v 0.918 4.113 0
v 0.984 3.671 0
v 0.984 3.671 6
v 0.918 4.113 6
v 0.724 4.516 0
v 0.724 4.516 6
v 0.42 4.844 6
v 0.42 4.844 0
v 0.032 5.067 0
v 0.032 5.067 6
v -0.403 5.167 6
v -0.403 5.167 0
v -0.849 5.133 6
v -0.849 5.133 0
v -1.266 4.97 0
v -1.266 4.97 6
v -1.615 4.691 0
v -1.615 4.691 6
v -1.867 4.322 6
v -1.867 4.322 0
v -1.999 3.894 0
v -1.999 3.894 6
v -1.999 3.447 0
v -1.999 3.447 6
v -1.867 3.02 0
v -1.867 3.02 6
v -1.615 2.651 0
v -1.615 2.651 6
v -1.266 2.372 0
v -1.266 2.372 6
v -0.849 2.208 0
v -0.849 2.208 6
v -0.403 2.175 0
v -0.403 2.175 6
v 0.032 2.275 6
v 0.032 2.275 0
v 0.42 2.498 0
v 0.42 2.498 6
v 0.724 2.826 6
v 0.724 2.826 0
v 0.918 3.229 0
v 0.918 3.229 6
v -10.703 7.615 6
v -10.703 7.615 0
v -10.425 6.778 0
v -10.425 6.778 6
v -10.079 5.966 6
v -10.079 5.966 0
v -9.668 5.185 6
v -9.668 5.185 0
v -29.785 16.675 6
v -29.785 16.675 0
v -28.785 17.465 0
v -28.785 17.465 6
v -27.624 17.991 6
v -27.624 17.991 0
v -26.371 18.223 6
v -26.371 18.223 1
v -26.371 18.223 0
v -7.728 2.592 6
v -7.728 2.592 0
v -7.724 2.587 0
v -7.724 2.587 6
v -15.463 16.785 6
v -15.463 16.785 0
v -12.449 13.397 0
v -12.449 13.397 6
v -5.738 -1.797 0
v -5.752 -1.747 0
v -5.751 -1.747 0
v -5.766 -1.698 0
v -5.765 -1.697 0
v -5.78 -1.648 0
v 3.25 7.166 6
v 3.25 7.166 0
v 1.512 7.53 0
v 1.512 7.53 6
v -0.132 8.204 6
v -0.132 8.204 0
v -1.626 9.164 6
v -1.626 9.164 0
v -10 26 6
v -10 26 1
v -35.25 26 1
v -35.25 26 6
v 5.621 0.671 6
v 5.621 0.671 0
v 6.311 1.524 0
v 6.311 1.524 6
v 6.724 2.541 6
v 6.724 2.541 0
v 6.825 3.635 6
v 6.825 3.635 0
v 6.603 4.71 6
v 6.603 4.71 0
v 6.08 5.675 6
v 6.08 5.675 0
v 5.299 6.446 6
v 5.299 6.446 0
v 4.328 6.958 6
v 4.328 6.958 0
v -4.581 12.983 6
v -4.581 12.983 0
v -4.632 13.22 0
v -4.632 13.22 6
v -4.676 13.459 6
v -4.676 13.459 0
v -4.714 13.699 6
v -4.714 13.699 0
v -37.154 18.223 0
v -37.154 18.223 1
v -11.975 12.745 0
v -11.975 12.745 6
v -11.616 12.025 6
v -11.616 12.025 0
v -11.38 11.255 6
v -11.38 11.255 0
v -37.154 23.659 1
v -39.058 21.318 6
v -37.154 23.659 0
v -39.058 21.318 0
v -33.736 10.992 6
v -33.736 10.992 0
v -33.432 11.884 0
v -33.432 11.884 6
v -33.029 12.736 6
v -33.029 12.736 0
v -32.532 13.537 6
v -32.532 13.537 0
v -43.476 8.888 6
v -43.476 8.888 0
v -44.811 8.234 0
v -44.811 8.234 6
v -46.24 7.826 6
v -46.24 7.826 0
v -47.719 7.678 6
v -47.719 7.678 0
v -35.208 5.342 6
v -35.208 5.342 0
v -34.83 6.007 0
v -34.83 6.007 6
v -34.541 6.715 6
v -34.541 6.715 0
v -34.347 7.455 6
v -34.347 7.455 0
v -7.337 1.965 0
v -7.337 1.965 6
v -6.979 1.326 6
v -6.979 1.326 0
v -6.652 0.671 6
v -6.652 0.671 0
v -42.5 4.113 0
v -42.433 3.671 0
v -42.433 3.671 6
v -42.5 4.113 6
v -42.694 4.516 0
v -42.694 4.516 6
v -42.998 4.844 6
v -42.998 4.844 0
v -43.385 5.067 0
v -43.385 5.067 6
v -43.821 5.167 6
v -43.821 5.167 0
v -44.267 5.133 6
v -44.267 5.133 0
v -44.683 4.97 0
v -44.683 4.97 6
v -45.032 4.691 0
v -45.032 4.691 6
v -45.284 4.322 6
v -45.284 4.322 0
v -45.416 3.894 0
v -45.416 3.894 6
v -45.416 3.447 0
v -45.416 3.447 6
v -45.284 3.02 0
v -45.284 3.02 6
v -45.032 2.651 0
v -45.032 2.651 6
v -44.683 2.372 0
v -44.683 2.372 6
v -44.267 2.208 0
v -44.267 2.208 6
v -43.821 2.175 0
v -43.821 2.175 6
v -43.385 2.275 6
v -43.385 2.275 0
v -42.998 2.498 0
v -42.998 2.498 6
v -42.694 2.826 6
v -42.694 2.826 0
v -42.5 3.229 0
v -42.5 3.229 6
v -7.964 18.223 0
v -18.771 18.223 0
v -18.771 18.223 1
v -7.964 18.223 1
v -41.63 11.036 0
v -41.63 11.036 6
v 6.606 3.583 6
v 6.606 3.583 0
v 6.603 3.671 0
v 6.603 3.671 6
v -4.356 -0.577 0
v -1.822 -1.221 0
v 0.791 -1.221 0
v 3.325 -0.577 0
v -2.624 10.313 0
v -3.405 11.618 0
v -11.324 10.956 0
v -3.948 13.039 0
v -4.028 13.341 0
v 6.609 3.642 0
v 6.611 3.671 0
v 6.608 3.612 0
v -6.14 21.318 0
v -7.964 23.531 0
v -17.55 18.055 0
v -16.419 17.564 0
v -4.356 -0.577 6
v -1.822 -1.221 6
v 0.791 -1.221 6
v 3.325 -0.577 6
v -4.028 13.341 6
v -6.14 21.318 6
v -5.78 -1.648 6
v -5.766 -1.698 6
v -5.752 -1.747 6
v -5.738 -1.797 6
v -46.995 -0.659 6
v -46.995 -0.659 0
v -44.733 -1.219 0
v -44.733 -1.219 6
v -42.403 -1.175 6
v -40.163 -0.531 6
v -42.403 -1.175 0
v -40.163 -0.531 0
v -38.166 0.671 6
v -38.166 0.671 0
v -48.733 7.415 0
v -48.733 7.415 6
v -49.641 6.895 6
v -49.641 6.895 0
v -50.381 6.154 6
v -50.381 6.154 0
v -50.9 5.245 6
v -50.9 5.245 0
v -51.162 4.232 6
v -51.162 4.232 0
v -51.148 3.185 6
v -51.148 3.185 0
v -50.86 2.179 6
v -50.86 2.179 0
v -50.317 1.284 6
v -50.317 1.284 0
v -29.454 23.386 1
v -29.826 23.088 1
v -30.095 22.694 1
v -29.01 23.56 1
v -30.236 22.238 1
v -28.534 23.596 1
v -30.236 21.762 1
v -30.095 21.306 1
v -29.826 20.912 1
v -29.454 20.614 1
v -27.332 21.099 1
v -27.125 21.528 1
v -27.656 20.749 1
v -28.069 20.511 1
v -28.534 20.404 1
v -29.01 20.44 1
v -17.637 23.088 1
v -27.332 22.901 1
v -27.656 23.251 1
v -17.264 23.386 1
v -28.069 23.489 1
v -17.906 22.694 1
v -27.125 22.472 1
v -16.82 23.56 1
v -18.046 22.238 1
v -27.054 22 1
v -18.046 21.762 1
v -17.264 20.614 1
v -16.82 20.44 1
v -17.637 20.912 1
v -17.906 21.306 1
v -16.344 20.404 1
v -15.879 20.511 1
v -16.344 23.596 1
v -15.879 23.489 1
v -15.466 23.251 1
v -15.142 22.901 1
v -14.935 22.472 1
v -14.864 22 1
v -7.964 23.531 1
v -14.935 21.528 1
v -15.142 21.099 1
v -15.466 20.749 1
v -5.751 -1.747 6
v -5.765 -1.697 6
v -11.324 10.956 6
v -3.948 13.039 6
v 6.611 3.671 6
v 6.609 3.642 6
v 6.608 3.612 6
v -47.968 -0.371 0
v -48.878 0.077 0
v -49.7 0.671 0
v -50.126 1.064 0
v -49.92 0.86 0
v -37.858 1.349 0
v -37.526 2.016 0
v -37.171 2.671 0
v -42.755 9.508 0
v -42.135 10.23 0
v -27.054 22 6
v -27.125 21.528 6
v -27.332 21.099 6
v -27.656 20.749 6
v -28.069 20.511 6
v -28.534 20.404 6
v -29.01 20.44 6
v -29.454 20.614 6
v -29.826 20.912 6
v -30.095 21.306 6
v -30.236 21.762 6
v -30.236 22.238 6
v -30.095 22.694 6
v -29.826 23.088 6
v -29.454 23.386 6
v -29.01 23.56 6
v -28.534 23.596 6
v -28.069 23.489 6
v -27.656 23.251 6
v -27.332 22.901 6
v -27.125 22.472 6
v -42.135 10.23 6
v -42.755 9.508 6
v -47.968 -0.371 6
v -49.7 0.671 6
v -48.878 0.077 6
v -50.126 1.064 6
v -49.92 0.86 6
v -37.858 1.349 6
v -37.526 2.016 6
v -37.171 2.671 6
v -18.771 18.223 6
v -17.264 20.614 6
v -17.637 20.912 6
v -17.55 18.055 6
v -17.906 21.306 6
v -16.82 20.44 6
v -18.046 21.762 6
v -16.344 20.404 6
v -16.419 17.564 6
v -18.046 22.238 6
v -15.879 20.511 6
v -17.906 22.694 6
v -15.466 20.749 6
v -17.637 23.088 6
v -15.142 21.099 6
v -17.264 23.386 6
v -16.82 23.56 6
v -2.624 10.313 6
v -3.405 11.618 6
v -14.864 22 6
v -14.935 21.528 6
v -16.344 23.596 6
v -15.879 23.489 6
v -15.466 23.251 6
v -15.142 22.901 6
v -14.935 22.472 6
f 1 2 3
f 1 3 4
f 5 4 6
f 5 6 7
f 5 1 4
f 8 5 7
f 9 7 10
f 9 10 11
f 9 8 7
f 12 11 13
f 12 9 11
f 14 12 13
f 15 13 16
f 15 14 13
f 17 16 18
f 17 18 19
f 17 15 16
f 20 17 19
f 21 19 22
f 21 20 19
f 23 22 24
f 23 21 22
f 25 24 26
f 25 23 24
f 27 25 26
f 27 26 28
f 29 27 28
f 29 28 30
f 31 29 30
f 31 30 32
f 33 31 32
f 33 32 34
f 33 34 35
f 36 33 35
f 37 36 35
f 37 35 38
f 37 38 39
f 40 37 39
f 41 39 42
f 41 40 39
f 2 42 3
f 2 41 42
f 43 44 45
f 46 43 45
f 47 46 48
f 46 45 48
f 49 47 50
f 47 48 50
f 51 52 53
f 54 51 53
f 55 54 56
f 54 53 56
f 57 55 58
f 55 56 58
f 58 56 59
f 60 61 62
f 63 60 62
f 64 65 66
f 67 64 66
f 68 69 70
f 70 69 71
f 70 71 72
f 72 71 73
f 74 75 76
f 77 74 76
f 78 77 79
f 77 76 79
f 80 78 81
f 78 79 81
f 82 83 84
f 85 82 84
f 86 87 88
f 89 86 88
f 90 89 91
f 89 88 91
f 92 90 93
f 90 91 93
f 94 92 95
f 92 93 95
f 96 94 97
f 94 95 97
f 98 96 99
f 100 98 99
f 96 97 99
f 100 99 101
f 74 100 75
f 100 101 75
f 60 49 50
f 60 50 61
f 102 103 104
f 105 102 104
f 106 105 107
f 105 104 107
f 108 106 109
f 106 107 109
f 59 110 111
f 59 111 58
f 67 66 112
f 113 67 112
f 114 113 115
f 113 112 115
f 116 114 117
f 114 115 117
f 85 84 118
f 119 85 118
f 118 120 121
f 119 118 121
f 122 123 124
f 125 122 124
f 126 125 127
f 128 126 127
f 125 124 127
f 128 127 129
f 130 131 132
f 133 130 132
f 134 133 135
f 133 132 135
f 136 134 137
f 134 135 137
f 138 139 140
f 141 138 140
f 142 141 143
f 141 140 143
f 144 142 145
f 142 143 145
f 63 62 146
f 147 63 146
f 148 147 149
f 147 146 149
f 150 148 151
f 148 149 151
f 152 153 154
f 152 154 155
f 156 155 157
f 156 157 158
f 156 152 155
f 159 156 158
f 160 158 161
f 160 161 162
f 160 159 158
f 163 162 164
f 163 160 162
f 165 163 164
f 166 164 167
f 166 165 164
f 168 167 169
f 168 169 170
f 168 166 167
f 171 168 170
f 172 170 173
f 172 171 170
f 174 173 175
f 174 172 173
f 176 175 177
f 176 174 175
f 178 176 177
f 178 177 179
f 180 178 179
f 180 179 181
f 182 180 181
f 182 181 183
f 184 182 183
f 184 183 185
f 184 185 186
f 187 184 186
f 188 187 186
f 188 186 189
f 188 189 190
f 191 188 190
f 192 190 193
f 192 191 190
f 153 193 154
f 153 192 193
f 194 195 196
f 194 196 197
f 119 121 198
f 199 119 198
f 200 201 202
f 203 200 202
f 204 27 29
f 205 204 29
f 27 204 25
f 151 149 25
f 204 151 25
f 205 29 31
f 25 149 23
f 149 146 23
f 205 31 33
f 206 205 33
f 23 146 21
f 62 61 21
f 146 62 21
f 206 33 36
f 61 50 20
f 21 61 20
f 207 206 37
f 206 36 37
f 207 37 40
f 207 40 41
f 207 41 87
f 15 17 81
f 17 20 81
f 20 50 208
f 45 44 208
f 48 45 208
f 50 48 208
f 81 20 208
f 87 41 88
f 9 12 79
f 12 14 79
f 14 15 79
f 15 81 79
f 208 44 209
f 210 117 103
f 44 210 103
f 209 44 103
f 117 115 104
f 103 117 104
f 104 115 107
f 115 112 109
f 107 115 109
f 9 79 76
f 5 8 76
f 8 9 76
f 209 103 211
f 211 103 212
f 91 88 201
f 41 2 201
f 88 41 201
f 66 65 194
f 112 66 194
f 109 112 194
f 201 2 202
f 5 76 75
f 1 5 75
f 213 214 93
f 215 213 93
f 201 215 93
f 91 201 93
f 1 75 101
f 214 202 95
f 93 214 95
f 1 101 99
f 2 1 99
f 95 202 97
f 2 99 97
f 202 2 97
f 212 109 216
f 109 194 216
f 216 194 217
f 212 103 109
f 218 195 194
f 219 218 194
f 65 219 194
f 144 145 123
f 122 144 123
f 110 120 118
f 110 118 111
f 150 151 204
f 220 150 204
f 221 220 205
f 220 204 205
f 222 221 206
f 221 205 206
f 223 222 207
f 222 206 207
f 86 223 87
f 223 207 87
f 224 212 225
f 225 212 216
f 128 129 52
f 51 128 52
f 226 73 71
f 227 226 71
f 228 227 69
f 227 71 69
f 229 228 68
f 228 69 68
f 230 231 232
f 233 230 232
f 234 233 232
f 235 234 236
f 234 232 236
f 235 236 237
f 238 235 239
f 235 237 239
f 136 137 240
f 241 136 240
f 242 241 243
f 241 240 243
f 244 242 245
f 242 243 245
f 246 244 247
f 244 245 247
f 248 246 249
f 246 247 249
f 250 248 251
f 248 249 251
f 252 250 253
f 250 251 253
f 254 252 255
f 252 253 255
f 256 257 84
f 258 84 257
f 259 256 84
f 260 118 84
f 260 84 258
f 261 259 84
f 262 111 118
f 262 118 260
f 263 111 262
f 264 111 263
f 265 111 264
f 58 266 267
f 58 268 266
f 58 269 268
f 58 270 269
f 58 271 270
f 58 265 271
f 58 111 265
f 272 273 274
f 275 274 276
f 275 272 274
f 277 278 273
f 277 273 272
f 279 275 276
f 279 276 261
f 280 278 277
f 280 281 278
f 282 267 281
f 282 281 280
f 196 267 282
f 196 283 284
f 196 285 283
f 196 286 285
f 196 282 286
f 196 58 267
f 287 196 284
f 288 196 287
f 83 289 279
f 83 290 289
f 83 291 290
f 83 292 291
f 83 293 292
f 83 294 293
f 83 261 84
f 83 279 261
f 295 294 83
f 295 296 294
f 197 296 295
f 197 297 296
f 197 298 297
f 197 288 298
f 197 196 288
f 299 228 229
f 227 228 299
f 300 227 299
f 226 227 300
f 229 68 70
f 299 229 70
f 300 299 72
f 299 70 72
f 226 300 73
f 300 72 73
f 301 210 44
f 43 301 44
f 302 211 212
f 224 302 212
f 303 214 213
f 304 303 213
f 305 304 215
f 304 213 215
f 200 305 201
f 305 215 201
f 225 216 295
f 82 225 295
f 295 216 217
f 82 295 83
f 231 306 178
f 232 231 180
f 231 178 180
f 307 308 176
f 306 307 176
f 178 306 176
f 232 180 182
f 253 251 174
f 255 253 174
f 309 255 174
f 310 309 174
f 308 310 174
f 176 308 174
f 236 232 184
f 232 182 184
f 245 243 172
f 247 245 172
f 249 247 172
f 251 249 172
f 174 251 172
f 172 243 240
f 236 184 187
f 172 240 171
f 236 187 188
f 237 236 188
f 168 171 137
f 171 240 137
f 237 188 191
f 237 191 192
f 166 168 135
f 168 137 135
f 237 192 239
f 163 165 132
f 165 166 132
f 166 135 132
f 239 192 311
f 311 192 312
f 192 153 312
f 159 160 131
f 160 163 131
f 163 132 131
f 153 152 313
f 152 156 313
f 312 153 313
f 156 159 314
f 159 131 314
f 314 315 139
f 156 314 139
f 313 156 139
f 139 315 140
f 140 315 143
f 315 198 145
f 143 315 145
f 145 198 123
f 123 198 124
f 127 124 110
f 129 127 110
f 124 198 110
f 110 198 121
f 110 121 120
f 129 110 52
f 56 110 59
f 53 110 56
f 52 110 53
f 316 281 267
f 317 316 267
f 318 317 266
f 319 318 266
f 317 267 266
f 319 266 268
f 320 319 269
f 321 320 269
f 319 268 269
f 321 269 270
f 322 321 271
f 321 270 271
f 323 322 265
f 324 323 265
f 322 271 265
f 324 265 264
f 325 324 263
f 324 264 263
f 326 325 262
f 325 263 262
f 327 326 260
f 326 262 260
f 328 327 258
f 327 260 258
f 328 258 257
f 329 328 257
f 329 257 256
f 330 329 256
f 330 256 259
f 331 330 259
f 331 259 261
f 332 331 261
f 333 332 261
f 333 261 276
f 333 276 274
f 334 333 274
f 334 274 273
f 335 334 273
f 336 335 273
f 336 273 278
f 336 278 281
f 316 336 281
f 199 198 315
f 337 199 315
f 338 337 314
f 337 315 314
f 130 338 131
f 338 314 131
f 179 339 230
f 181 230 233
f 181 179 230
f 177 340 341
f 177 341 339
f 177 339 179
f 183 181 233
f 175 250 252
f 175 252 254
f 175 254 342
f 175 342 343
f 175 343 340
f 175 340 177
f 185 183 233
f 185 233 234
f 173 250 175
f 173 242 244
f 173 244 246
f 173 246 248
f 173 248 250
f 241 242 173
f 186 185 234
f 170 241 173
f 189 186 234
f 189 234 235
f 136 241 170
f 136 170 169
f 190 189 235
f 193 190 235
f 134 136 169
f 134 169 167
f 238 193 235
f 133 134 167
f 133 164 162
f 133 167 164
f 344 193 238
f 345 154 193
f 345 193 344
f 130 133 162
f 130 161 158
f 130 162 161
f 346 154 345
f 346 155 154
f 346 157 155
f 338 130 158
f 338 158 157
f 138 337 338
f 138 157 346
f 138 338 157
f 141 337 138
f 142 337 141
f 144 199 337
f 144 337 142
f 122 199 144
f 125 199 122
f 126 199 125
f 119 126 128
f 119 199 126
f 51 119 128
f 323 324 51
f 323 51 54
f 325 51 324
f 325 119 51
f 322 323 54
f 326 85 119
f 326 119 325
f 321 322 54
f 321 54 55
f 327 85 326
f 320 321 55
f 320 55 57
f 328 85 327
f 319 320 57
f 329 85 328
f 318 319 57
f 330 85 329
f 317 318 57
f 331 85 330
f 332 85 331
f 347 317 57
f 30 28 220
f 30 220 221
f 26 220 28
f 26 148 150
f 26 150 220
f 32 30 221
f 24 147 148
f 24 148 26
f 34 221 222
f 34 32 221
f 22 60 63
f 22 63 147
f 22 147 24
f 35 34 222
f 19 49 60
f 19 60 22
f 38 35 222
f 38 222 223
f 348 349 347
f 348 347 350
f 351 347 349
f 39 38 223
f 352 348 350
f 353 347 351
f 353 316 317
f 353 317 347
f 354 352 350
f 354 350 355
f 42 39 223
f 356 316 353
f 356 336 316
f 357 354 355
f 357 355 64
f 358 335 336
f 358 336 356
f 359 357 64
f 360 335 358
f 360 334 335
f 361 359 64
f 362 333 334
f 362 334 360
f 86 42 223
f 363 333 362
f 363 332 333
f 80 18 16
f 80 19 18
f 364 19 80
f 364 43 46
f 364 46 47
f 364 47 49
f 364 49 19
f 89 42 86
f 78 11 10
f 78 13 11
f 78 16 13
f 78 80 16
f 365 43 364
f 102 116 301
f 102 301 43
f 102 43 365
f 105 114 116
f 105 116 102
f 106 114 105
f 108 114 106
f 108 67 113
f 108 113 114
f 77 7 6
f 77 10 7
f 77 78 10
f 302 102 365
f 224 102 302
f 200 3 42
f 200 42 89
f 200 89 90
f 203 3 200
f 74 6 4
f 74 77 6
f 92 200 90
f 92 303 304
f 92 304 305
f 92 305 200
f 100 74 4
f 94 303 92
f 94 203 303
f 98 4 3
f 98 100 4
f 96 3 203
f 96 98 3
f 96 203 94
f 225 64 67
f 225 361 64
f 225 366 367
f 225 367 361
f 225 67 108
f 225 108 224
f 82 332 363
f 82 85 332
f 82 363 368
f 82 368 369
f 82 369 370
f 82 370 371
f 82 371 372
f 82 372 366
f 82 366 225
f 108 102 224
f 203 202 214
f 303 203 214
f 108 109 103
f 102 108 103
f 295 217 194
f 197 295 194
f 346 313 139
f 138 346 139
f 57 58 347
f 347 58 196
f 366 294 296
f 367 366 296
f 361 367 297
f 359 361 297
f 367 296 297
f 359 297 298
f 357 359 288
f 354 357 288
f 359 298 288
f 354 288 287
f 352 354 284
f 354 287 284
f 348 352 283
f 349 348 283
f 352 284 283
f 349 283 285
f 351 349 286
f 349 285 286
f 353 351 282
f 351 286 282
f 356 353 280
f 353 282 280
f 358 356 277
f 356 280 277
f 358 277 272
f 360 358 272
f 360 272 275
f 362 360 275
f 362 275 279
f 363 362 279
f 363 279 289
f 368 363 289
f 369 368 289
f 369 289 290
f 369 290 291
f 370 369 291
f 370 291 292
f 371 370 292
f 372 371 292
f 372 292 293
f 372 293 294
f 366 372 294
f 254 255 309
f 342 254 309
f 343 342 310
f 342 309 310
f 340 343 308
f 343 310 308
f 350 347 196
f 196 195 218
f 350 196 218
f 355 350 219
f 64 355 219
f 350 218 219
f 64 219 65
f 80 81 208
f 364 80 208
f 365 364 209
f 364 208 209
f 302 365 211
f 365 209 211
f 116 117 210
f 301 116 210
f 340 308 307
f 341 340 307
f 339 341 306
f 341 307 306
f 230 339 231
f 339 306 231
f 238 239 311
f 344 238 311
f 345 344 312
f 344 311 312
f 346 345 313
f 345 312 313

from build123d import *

# Parameters (mm, degrees)
F0_R     = 1.5
F1_DEPTH = 6
F2_W     = 29.1895474304
F2_H     = 8.1068262217
F3_DEPTH = 1
F4_R     = 1.6
F5_DEPTH = 25


with BuildPart() as f1:
    # F0 (on Top) → F1 (new body)
    with BuildSketch(Plane.XY):
        with BuildLine():
            Line((-10, 26), (-35.2495634258, 26))
            Line((-35.2495634258, 26), (-39.057527268, 21.3184167468))
            Line((-39.057527268, 21.3184167468), (-41.6304210197, 11.0364185063))
            ThreePointArc((-41.6304210197, 11.0364185063), (-42.4311486923, 9.8573407468), (-43.4759554631, 8.8879244376))
            ThreePointArc((-43.4759554631, 8.8879244376), (-45.51650016, 7.9985812964), (-47.7191541257, 7.6775370778))
            ThreePointArc((-47.7191541257, 7.6775370778), (-50.9003861294, 5.2453676624), (-50.3167290744, 1.2836723726))
            ThreePointArc((-50.3167290744, 1.2836723726), (-50.0192314636, 0.9660998742), (-49.6996038757, 0.6708113287))
            ThreePointArc((-49.6996038757, 0.6708113287), (-48.4319460234, -0.1659790532), (-46.995387251, -0.6594093592))
            ThreePointArc((-46.995387251, -0.6594093592), (-42.402871488, -1.1752804225), (-38.1662136975, 0.6708113287))
            ThreePointArc((-38.1662136975, 0.6708113287), (-37.6947830716, 1.6839626336), (-37.1705197268, 2.6708113287))
            Line((-37.1705197268, 2.6708113287), (-35.2077888071, 5.3416226573))
            ThreePointArc((-35.2077888071, 5.3416226573), (-34.6739031487, 6.3562206362), (-34.3466389772, 7.4550113884))
            Line((-34.3466389772, 7.4550113884), (-33.7362494579, 10.9917901425))
            ThreePointArc((-33.7362494579, 10.9917901425), (-33.2424472917, 12.3157626035), (-32.5319427601, 13.5372072267))
            Line((-32.5319427601, 13.5372072267), (-29.7846236034, 16.6751274652))
            ThreePointArc((-29.7846236034, 16.6751274652), (-28.2204332697, 17.7634209708), (-26.3712517917, 18.2234231624))
            Line((-26.3712517917, 18.2234231624), (-18.7730714679, 18.2234231624))
            Line((-18.7730714679, 18.2234231624), (-18.771239616, 18.2234231624))
            ThreePointArc((-18.771239616, 18.2234231624), (-16.9678088596, 17.8481072738), (-15.4634089727, 16.7850901103))
            Line((-15.4634089727, 16.7850901103), (-12.4487311379, 13.3968793328))
            ThreePointArc((-12.4487311379, 13.3968793328), (-11.7807395516, 12.3925325218), (-11.3797099055, 11.2549471408))
            ThreePointArc((-11.3797099055, 11.2549471408), (-11.3495947952, 11.1058740041), (-11.3241430986, 10.9559342458))
            Line((-11.3241430986, 10.9559342458), (-10.7032877635, 7.6150233392))
            ThreePointArc((-10.7032877635, 7.6150233392), (-10.2604433533, 6.3680457187), (-9.6682160293, 5.1846898321))
            Line((-9.6682160293, 5.1846898321), (-7.7281862056, 2.592344916))
            Line((-7.7281862056, 2.592344916), (-7.7238523924, 2.5865539027))
            ThreePointArc((-7.7238523924, 2.5865539027), (-7.1542376439, 1.6475817928), (-6.6521927802, 0.6708113287))
            ThreePointArc((-6.6521927802, 0.6708113287), (-0.5155238845, -1.3021562504), (5.6211450111, 0.6708113287))
            ThreePointArc((5.6211450111, 0.6708113287), (6.6033357025, 4.7097738492), (3.25, 7.1660019457))
            ThreePointArc((3.25, 7.1660019457), (0.6744644557, 7.8294460888), (-1.6262272263, 9.163747125))
            ThreePointArc((-1.6262272263, 9.163747125), (-3.0431070459, 10.948065824), (-3.9476649338, 13.0392656399))
            ThreePointArc((-3.9476649338, 13.0392656399), (-3.9889402222, 13.1896618294), (-4.0275107165, 13.3407743047))
            Line((-4.0275107165, 13.3407743047), (-6.1401568189, 21.3184167468))
            Line((-6.1401568189, 21.3184167468), (-10, 26))
        make_face()
        with Locations((-43.9329087866, 3.6708113287)):
            Circle(F0_R, mode=Mode.SUBTRACT)
        with Locations((-0.5155238845, 3.6708113287)):
            Circle(F0_R, mode=Mode.SUBTRACT)
        with BuildLine():
            Line((6.605921809, 3.5830009729), (6.6033259315, 3.6708113287))
            Line((6.6033259315, 3.6708113287), (6.6105232638, 3.6708113287))
            ThreePointArc((6.6105232638, 3.6708113287), (6.6085095309, 3.6268911116), (6.605921809, 3.5830009729))
        make_face(mode=Mode.SUBTRACT)
        with BuildLine():
            ThreePointArc((-4.5809692163, 12.9828511217), (-4.6550041334, 13.3393767265), (-4.7139979165, 13.6986974876))
            Line((-4.7139979165, 13.6986974876), (-4.5809692163, 12.9828511217))
        make_face(mode=Mode.SUBTRACT)
        with BuildLine():
            Line((-3.9476649338, 13.0392656399), (-4.0275107165, 13.3407743047))
            ThreePointArc((-4.0275107165, 13.3407743047), (-3.9889402222, 13.1896618294), (-3.9476649338, 13.0392656399))
        make_face()
        with BuildLine():
            ThreePointArc((-49.6996038757, 0.6708113287), (-50.0192314636, 0.9660998742), (-50.3167290744, 1.2836723726))
            ThreePointArc((-50.3167290744, 1.2836723726), (-50.0251028728, 0.9601876131), (-49.6996038757, 0.6708113287))
        make_face()
        with BuildLine():
            Line((-11.3797099055, 11.2549471408), (-11.3241430986, 10.9559342458))
            ThreePointArc((-11.3241430986, 10.9559342458), (-11.3495947952, 11.1058740041), (-11.3797099055, 11.2549471408))
        make_face()
    extrude(amount=F1_DEPTH)

    # F2 (on face) → F3 (cut)
    with BuildSketch(Plane(origin=(0, 0, 0), x_dir=(1, 0, 0), z_dir=(0, 0, -1))):
        with Locations((-22.5587716317, -22.2768362732)):
            Rectangle(F2_W, F2_H)
    extrude(amount=-F3_DEPTH, mode=Mode.SUBTRACT)

    # F4 (on face) → F5 (cut)
    with BuildSketch(Plane(origin=(0, 0, 1), x_dir=(1, 0, 0), z_dir=(0, 0, -1))):
        with Locations((-28.6535453469, -22)):
            Circle(F4_R)
        with Locations((-16.4639979165, -22)):
            Circle(F4_R)
    extrude(amount=-F5_DEPTH, mode=Mode.SUBTRACT)


with BuildPart() as f1b:
    # F0 (on Top) → F1, piece 2 (new body)
    with BuildSketch(Plane.XY):
        with BuildLine():
            ThreePointArc((-5.7375235555, -1.796991188), (-5.7584344051, -1.7222672905), (-5.7797171889, -1.6476484751))
            ThreePointArc((-5.7797171889, -1.6476484751), (-5.7594808885, -1.7225629523), (-5.7375235555, -1.796991188))
        make_face()
    extrude(amount=F1_DEPTH)


solid = Compound([f1.part, f1b.part])
